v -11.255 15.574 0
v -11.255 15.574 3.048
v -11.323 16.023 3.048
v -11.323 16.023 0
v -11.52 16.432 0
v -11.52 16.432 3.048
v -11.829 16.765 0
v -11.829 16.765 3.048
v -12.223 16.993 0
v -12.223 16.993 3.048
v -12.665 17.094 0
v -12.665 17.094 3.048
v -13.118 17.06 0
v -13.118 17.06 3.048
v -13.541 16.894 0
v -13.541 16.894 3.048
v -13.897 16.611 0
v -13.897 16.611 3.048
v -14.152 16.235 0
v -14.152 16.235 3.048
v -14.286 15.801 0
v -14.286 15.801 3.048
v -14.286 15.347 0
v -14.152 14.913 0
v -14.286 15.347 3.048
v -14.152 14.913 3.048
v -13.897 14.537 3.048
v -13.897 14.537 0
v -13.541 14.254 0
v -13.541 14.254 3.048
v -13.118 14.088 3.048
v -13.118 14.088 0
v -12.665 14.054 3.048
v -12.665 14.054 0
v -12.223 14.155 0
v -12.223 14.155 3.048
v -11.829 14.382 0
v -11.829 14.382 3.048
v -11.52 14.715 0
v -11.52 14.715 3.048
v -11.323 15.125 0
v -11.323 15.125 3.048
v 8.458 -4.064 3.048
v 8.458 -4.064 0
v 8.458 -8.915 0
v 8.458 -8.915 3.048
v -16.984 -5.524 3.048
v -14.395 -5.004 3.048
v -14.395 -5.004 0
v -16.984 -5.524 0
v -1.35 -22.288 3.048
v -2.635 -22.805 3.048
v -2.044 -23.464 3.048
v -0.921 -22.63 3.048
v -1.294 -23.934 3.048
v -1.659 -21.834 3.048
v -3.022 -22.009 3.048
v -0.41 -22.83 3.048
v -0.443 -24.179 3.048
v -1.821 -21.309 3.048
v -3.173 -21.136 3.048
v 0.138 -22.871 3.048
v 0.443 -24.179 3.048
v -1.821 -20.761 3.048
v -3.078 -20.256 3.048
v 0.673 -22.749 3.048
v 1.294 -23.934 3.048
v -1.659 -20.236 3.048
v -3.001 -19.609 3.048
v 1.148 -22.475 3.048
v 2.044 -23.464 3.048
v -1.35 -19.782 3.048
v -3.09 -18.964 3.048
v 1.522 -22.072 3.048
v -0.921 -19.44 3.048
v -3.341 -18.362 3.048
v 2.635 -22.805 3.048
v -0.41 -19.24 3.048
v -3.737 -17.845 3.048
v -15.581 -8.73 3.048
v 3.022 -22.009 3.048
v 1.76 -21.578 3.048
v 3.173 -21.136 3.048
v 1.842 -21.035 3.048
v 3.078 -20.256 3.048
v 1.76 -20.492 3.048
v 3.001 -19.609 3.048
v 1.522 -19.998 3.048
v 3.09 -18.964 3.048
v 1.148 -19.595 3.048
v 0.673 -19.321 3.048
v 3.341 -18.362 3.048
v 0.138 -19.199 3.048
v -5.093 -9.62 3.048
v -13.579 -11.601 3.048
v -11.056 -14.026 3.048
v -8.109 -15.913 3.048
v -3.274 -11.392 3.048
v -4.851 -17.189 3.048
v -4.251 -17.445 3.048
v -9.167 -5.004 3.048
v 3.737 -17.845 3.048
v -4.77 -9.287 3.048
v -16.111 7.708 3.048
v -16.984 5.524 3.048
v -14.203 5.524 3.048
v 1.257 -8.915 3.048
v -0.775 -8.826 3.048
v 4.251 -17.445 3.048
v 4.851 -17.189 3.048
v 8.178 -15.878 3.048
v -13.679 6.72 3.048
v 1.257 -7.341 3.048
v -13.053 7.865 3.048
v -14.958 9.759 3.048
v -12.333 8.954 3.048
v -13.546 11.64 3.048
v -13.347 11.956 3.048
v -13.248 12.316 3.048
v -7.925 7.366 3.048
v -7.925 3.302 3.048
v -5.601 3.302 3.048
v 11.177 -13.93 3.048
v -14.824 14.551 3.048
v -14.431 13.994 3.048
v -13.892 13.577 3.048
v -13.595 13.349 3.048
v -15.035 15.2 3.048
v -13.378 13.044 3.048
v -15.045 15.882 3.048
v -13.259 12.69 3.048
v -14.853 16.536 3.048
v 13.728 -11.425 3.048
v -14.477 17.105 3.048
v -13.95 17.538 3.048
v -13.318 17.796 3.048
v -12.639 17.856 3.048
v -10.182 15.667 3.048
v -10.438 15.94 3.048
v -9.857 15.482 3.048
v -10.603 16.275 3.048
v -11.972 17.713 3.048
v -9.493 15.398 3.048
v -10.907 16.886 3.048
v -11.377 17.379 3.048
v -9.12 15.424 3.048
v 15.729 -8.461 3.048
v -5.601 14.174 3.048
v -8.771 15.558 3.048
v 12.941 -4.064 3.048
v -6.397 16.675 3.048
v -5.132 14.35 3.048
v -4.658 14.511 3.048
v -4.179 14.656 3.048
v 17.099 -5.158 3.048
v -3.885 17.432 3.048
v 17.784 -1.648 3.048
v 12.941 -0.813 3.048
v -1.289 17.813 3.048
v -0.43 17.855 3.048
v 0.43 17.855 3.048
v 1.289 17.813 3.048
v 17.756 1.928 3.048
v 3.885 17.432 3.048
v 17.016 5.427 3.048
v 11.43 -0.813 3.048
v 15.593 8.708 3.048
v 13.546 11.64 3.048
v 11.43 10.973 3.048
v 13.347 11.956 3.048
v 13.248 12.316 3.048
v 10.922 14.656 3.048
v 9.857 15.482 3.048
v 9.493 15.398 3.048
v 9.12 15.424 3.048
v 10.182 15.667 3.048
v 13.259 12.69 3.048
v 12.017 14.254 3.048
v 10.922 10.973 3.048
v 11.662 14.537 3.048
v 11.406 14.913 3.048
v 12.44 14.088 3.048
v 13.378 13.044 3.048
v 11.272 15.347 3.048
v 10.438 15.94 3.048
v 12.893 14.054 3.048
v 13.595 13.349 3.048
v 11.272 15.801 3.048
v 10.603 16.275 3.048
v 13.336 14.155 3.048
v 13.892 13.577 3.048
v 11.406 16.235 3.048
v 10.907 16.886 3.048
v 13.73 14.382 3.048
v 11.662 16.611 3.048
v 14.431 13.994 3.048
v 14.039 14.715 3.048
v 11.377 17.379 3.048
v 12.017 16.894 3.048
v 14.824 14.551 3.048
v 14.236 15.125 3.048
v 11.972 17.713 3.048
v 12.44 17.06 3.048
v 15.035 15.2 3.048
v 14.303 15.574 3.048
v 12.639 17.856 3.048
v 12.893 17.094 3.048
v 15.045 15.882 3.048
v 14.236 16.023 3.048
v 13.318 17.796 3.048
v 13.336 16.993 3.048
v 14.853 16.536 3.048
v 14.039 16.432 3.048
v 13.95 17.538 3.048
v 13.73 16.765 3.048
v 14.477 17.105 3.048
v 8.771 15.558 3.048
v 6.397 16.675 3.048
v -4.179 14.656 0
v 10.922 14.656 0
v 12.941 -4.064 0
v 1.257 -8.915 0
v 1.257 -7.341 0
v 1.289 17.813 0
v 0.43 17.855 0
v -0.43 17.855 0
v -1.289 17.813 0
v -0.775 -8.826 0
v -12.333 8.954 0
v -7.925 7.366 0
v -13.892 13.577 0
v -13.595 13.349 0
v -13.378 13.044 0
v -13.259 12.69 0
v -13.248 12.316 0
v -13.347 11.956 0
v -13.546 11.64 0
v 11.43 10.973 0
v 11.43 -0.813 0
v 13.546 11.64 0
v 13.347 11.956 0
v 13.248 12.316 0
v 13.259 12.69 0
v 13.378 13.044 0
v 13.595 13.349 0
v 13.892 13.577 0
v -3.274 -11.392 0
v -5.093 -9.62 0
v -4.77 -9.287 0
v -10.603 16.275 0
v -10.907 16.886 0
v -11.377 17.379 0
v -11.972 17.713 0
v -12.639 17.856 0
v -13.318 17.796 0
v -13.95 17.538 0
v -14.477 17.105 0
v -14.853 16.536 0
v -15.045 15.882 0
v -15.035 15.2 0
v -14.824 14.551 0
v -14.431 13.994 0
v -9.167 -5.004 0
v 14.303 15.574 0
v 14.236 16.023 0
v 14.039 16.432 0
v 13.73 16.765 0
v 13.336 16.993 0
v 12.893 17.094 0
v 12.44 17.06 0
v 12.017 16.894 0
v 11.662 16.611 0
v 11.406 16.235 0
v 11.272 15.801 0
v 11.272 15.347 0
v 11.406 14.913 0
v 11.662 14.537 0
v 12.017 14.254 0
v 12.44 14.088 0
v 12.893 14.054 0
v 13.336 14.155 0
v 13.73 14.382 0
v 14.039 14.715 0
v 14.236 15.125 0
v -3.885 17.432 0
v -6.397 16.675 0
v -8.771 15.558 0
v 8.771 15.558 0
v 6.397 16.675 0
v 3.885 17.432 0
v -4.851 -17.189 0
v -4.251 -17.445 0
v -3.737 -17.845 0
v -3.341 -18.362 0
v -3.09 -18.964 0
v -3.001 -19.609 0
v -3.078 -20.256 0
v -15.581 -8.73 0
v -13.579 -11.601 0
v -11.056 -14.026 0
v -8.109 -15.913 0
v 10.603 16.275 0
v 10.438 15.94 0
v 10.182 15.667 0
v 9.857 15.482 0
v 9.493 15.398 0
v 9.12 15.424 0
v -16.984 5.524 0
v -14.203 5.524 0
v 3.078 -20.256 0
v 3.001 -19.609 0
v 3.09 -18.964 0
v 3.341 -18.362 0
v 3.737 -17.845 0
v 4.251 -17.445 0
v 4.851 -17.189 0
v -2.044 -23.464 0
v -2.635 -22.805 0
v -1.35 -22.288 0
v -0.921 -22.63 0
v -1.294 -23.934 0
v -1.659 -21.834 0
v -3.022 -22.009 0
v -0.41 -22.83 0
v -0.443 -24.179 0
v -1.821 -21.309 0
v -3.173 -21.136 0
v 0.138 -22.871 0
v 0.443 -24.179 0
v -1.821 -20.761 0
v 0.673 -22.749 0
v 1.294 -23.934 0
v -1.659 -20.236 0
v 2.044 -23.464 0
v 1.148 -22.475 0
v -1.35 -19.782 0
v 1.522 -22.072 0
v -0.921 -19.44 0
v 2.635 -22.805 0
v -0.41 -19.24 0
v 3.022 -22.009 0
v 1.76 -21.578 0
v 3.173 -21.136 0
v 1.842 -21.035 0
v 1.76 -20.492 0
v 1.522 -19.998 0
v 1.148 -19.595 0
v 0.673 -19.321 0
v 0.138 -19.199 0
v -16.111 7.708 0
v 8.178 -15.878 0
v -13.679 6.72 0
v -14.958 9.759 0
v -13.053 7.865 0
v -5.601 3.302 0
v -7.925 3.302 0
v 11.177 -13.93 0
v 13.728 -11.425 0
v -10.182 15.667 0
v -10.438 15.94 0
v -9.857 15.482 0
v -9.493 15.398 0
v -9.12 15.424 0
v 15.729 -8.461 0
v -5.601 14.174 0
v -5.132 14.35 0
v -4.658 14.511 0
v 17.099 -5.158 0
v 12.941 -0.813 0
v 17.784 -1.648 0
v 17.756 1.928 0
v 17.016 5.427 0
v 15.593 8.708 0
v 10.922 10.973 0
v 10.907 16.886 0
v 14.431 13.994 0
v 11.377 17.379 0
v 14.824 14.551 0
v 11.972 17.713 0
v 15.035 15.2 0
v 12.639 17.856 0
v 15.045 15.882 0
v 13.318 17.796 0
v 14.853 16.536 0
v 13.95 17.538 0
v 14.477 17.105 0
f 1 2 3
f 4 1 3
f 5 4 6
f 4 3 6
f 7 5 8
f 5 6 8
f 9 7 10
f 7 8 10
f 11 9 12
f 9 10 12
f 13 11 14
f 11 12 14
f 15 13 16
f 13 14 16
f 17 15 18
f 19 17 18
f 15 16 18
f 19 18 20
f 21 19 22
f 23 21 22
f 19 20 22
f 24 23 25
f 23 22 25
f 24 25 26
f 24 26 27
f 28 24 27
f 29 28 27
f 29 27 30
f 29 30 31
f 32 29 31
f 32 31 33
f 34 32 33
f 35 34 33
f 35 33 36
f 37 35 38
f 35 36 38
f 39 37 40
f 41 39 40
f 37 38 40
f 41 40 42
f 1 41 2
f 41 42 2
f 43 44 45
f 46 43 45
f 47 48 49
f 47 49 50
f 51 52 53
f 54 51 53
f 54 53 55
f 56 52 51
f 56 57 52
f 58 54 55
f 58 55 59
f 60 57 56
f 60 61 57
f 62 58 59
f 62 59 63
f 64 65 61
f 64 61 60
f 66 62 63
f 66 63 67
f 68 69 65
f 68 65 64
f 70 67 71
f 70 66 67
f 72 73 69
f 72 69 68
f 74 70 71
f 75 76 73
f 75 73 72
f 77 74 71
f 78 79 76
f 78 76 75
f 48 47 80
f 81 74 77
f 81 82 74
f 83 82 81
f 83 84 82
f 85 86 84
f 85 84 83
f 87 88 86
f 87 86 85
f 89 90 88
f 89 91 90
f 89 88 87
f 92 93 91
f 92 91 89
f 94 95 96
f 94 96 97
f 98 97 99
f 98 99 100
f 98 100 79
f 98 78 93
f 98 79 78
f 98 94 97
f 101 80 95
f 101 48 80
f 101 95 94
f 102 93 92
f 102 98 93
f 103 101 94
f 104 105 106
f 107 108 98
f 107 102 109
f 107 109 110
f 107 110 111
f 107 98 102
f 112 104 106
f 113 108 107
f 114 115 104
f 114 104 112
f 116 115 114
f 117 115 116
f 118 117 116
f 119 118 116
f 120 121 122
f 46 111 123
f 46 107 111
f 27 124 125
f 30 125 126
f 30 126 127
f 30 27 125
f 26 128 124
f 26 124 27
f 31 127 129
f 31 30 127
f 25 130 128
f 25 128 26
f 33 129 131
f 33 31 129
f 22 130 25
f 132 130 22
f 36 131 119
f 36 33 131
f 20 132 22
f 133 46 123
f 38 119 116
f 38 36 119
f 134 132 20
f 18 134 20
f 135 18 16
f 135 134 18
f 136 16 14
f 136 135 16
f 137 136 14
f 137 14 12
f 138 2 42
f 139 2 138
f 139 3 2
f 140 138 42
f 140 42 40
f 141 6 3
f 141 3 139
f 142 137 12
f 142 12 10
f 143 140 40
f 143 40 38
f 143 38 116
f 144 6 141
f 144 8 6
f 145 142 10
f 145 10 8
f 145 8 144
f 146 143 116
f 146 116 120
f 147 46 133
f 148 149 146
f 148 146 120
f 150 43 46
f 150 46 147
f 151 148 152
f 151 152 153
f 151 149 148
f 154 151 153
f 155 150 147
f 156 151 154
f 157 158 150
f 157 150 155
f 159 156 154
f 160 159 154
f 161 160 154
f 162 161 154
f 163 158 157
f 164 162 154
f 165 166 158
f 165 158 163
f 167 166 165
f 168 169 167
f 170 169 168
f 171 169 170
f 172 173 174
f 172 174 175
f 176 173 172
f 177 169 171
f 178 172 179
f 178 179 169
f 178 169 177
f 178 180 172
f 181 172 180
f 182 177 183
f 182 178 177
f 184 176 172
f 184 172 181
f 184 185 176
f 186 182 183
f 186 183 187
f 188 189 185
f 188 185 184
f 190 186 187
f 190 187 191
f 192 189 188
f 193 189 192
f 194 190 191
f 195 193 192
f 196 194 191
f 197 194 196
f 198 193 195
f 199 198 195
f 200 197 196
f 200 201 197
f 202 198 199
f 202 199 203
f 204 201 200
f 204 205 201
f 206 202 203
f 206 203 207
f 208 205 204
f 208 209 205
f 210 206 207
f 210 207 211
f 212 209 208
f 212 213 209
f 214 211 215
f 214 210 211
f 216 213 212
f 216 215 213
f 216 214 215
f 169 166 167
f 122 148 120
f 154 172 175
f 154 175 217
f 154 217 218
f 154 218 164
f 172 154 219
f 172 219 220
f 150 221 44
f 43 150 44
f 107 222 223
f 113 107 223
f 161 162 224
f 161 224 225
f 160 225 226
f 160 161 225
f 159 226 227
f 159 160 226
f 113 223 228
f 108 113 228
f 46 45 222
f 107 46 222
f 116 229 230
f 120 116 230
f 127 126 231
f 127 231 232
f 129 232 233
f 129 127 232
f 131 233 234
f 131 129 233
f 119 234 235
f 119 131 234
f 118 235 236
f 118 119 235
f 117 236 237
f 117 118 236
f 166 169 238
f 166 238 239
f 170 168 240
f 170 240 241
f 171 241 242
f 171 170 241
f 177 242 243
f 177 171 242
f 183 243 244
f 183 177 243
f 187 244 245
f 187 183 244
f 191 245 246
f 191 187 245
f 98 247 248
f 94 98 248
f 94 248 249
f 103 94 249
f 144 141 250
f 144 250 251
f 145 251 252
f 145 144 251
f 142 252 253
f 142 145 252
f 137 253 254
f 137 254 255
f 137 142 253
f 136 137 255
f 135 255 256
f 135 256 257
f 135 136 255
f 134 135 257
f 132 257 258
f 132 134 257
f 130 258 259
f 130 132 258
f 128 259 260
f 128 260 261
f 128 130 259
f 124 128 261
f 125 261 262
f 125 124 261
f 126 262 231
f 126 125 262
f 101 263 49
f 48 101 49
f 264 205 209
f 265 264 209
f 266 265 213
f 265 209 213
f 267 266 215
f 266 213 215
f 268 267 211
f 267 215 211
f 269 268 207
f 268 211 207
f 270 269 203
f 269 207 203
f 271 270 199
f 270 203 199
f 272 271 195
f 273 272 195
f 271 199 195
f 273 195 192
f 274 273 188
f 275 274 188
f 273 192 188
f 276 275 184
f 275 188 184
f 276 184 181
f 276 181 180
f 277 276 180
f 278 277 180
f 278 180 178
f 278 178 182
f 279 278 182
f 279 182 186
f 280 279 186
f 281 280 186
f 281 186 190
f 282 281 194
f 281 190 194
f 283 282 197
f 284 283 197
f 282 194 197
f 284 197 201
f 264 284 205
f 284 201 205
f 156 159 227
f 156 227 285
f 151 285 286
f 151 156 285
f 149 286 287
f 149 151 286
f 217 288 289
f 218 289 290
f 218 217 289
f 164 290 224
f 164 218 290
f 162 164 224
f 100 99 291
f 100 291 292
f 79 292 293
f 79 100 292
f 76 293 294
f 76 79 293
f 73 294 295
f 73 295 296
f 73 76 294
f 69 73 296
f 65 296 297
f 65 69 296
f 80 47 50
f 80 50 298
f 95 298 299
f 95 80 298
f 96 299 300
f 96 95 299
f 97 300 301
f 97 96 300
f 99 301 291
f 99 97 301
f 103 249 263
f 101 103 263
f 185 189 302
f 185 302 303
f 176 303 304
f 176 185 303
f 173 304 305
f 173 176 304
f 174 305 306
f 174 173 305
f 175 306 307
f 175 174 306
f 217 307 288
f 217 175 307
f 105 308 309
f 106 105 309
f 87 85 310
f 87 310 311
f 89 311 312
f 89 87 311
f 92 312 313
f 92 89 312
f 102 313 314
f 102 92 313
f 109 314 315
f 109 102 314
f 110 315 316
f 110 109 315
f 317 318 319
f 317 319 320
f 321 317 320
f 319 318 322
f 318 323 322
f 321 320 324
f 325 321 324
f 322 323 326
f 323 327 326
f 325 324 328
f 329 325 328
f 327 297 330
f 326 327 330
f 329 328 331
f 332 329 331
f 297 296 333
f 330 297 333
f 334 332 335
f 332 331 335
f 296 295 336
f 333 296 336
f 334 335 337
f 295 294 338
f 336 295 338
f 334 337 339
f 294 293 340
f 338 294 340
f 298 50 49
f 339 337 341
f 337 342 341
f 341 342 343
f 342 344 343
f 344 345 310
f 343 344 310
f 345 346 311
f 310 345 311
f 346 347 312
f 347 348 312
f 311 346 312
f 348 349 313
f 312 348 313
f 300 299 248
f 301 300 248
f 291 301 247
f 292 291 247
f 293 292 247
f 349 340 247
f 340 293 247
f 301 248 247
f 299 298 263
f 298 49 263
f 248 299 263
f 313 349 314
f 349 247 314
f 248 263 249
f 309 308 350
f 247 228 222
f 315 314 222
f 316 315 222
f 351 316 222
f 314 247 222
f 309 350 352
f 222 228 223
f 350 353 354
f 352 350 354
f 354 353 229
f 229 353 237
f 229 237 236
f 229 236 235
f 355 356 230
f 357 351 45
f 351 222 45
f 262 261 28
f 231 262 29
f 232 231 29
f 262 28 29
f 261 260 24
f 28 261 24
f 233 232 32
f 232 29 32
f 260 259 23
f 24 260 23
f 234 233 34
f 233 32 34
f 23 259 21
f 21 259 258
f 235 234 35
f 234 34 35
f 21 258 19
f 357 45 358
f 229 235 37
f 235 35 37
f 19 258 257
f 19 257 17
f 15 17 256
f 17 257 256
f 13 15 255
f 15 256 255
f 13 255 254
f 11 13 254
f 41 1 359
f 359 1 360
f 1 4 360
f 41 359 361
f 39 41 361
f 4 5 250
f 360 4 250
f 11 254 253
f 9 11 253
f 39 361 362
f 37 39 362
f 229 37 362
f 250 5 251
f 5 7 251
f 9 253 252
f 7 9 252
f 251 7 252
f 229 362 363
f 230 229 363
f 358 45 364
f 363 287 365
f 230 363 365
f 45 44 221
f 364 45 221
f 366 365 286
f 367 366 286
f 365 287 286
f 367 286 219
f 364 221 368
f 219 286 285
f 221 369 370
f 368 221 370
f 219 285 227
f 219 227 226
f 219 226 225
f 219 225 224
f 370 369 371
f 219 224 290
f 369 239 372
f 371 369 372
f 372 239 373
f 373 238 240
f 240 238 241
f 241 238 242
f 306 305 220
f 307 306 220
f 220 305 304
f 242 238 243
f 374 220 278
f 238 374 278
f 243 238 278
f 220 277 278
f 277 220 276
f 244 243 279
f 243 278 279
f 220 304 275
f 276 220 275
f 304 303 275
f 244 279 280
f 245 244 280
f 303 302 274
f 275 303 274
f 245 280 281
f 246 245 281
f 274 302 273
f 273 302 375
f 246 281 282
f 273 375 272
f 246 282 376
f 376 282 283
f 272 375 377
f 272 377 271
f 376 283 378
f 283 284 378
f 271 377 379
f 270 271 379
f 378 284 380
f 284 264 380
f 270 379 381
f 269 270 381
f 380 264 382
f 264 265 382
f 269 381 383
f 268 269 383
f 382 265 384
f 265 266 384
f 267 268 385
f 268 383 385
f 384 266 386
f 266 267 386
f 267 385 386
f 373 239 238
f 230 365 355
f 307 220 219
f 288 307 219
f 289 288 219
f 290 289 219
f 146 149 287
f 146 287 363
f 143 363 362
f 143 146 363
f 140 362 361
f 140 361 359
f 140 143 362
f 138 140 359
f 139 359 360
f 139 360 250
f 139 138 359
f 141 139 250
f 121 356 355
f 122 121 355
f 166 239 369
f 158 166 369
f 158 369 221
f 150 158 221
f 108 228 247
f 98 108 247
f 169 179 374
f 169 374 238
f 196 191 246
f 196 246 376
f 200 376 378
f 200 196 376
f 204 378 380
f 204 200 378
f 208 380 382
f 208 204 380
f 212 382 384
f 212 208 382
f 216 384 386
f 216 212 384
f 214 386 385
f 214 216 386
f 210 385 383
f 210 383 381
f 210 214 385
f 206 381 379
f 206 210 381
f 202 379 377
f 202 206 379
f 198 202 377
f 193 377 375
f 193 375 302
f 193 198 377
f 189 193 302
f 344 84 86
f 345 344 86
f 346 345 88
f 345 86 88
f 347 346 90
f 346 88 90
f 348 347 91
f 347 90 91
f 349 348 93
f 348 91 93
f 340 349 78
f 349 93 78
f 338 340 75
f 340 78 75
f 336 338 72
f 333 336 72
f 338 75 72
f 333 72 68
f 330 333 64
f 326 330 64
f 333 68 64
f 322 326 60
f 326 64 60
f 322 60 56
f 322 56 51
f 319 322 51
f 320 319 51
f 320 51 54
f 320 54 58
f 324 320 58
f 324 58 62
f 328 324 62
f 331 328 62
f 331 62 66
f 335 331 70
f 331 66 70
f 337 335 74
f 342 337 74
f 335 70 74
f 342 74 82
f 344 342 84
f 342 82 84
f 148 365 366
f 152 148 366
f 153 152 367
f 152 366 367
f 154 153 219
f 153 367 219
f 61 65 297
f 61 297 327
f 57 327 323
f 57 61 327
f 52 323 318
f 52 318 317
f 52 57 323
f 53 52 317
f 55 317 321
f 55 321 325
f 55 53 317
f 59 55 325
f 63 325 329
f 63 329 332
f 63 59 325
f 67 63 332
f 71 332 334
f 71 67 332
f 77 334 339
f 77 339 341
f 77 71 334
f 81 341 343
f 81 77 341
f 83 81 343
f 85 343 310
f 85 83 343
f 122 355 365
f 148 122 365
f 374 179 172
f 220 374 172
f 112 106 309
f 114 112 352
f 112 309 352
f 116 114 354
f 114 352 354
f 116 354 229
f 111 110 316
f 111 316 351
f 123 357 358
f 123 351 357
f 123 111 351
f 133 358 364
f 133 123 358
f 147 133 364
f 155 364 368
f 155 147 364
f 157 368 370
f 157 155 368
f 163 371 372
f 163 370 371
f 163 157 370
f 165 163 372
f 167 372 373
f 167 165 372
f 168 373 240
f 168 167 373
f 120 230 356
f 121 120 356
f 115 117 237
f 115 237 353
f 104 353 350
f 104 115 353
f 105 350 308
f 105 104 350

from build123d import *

# Parameters (mm, degrees)
SKETCH1_R           = 1.4224
BOSS_EXTRUDE1_DEPTH = 3.048
CUT_EXTRUDE1_DEPTH  = 31.684629768
SKETCH3_R           = 21.59
SKETCH3_R_2         = 17.859965052
CUT_EXTRUDE2_DEPTH  = 31.684629768
SKETCH4_R           = 1.524
SKETCH4_R_2         = 1.8415
BOSS_EXTRUDE3_DEPTH = 3.048
SKETCH7_W           = 0.508
SKETCH7_H           = 3.683
BOSS_EXTRUDE4_DEPTH = 3.048


with BuildPart() as part:
    # Sketch1 → Boss-Extrude1 (new body)
    with BuildSketch(Plane.XY):
        with BuildLine():
            Line((-14.952058744, -2.948480848), (-16.984058744, -2.948480848))
            Line((-16.984058744, -2.948480848), (-16.984058744, -5.5245))
            Line((-16.984058744, -5.5245), (-20.871224203, -5.5245))
            ThreePointArc((-20.871224203, -5.5245), (21.59, 0), (-20.871224203, 5.5245))
            Line((-20.871224203, 5.5245), (-16.984058744, 5.5245))
            Line((-16.984058744, 5.5245), (-16.984058744, 2.948480848))
            Line((-16.984058744, 2.948480848), (-14.952058744, 2.948480848))
            ThreePointArc((-14.952058744, 2.948480848), (-13.968818521, 6.093415226), (-12.332576282, 8.9535))
            Line((-12.332576282, 8.9535), (-7.9248, 7.366))
            Line((-7.9248, 7.366), (-7.9248, 3.302))
            Line((-7.9248, 3.302), (-5.6007, 3.302))
            Line((-5.6007, 3.302), (-5.6007, 14.173558463))
            ThreePointArc((-5.6007, 14.173558463), (-4.895856129, 14.43219293), (-4.179129857, 14.6558))
            Line((-4.179129857, 14.6558), (4.179129857, 14.6558))
            Line((4.179129857, 14.6558), (11.43, 14.6558))
            Line((11.43, 14.6558), (11.43, -0.8128))
            Line((11.43, -0.8128), (12.9413, -0.8128))
            Line((12.9413, -0.8128), (12.9413, -4.064))
            Line((12.9413, -4.064), (8.4582, -4.064))
            Line((8.4582, -4.064), (8.4582, -8.9154))
            Line((8.4582, -8.9154), (1.2573, -8.9154))
            Line((1.2573, -8.9154), (1.2573, -7.3406))
            Line((1.2573, -7.3406), (-0.7747, -8.8265))
            Line((-0.7747, -8.8265), (-3.273729572, -11.3919))
            Line((-3.273729572, -11.3919), (-5.093162196, -9.619538602))
            Line((-5.093162196, -9.619538602), (-4.769706241, -9.287492148))
            Line((-4.769706241, -9.287492148), (-9.167166743, -5.0038))
            Line((-9.167166743, -5.0038), (-14.395123673, -5.0038))
            ThreePointArc((-14.395123673, -5.0038), (-14.709533071, -3.985879682), (-14.952058744, -2.948480848))
        make_face()
        with Locations(Location((0, 18.415, 0), (0, 0, 180))):
            Circle(SKETCH1_R, mode=Mode.SUBTRACT)
        with Locations(Location((0, -18.415, 0), (0, 0, 180))):
            Circle(SKETCH1_R, mode=Mode.SUBTRACT)
    extrude(amount=BOSS_EXTRUDE1_DEPTH)

    # Sketch2 → Cut-Extrude1 (cut, through all)
    with BuildSketch(Plane.XY.offset(3.048)):
        Polygon((-14.395123673, -5.0038), (-16.984058744, -5.5245), (-16.984058744, 5.5245), (-14.203432675, 5.5245), align=None)
    extrude(amount=-CUT_EXTRUDE1_DEPTH, mode=Mode.SUBTRACT)

    # Sketch3 → Cut-Extrude2 (cut, through all)
    with BuildSketch(Plane.XY.offset(3.048)):
        Circle(SKETCH3_R)
        Circle(SKETCH3_R_2, mode=Mode.SUBTRACT)
    extrude(amount=-CUT_EXTRUDE2_DEPTH, mode=Mode.SUBTRACT)


with BuildPart() as cut_extrude2_piece_1:
    # of the separate pieces the step leaves, piece 1, a body of its own (cut_extrude2_pieces)
    add(part.part.solids().sort_by_distance((-14.395123673, -5.0038, 0))[0])



with BuildPart() as cut_extrude2_piece_2:
    # of the separate pieces the step leaves, piece 2, a body of its own (cut_extrude2_pieces)
    add(part.part.solids().sort_by_distance((-16.984058744, 5.5245, 0))[0])


with BuildPart() as cut_extrude2_piece_1_1:
    add(cut_extrude2_piece_1.part)

    add(cut_extrude2_piece_2.part)  # Boss-Extrude3 merges Cut-Extrude2 piece 2
    # Sketch4 → Boss-Extrude3 (add)
    # profile 1 of 4: a face of its own
    with BuildSketch(Plane.XY.offset(3.048)):
        with BuildLine():
            ThreePointArc((8.770915547, 15.557936629), (9.49974685, 15.123926787), (10.207148379, 14.6558))
            Line((10.207148379, 14.6558), (11.43, 14.6558))
            Line((11.43, 14.6558), (11.43, 13.723463545))
            ThreePointArc((11.43, 13.723463545), (12.531489365, 12.72556977), (13.546192441, 11.639545611))
            ThreePointArc((13.546192441, 11.639545611), (13.259158271, 12.690113644), (13.891550536, 13.576771317))
            ThreePointArc((13.891550536, 13.576771317), (14.229434963, 17.341171724), (10.603438482, 16.274857592))
            ThreePointArc((10.603438482, 16.274857592), (9.857305907, 15.481530348), (8.770915547, 15.557936629))
        make_face()
        with Locations((12.779339593, 15.573965052)):
            Circle(SKETCH4_R, mode=Mode.SUBTRACT)
    # profile 2 of 4: a face of its own
    with BuildSketch(Plane.XY.offset(3.048)):
        with BuildLine():
            ThreePointArc((-1.288911844, 17.813395463), (0, 16.9926), (1.288911844, 17.813395463))
            ThreePointArc((1.288911844, 17.813395463), (0, 17.859965052), (-1.288911844, 17.813395463))
        make_face()
    # profile 3 of 4: a face of its own
    with BuildSketch(Plane.XY.offset(3.048)):
        with BuildLine():
            ThreePointArc((-8.770915605, 15.557936596), (-9.857305878, 15.481530337), (-10.603438442, 16.274857469))
            ThreePointArc((-10.603438442, 16.274857469), (-14.229434898, 17.341171777), (-13.891550571, 13.576771336))
            ThreePointArc((-13.891550571, 13.576771336), (-13.259158271, 12.690113644), (-13.546192467, 11.639545581))
            ThreePointArc((-13.546192467, 11.639545581), (-11.329244247, 13.806758362), (-8.770915605, 15.557936596))
        make_face()
        with Locations((-12.779339593, 15.573965052)):
            Circle(SKETCH4_R, mode=Mode.SUBTRACT)
    # profile 4 of 4: a face of its own
    with BuildSketch(Plane.XY.offset(3.048)):
        with BuildLine():
            ThreePointArc((3.078011458, -20.256202915), (3.341190672, -18.362372873), (4.85058289, -17.188664791))
            ThreePointArc((4.85058289, -17.188664791), (3.085598969, -17.591402181), (1.288911844, -17.813395463))
            ThreePointArc((1.288911844, -17.813395463), (0, -16.9926), (-1.288911844, -17.813395463))
            ThreePointArc((-1.288911844, -17.813395463), (-3.085599014, -17.591402173), (-4.850582978, -17.188664766))
            ThreePointArc((-4.850582978, -17.188664766), (-3.341190697, -18.36237283), (-3.078011456, -20.256202907))
            ThreePointArc((-3.078011456, -20.256202907), (-4e-09, -24.209965052), (3.078011458, -20.256202915))
        make_face()
        with Locations((0, -21.034965052)):
            Circle(SKETCH4_R_2, mode=Mode.SUBTRACT)
    extrude(amount=-BOSS_EXTRUDE3_DEPTH)

    # Sketch7 → Boss-Extrude4 (add)
    with BuildSketch(Plane.XY.offset(3.048)):
        with Locations((11.176, 12.8143)):
            Rectangle(SKETCH7_W, SKETCH7_H)
    extrude(amount=-BOSS_EXTRUDE4_DEPTH)


solid = cut_extrude2_piece_1_1.part
